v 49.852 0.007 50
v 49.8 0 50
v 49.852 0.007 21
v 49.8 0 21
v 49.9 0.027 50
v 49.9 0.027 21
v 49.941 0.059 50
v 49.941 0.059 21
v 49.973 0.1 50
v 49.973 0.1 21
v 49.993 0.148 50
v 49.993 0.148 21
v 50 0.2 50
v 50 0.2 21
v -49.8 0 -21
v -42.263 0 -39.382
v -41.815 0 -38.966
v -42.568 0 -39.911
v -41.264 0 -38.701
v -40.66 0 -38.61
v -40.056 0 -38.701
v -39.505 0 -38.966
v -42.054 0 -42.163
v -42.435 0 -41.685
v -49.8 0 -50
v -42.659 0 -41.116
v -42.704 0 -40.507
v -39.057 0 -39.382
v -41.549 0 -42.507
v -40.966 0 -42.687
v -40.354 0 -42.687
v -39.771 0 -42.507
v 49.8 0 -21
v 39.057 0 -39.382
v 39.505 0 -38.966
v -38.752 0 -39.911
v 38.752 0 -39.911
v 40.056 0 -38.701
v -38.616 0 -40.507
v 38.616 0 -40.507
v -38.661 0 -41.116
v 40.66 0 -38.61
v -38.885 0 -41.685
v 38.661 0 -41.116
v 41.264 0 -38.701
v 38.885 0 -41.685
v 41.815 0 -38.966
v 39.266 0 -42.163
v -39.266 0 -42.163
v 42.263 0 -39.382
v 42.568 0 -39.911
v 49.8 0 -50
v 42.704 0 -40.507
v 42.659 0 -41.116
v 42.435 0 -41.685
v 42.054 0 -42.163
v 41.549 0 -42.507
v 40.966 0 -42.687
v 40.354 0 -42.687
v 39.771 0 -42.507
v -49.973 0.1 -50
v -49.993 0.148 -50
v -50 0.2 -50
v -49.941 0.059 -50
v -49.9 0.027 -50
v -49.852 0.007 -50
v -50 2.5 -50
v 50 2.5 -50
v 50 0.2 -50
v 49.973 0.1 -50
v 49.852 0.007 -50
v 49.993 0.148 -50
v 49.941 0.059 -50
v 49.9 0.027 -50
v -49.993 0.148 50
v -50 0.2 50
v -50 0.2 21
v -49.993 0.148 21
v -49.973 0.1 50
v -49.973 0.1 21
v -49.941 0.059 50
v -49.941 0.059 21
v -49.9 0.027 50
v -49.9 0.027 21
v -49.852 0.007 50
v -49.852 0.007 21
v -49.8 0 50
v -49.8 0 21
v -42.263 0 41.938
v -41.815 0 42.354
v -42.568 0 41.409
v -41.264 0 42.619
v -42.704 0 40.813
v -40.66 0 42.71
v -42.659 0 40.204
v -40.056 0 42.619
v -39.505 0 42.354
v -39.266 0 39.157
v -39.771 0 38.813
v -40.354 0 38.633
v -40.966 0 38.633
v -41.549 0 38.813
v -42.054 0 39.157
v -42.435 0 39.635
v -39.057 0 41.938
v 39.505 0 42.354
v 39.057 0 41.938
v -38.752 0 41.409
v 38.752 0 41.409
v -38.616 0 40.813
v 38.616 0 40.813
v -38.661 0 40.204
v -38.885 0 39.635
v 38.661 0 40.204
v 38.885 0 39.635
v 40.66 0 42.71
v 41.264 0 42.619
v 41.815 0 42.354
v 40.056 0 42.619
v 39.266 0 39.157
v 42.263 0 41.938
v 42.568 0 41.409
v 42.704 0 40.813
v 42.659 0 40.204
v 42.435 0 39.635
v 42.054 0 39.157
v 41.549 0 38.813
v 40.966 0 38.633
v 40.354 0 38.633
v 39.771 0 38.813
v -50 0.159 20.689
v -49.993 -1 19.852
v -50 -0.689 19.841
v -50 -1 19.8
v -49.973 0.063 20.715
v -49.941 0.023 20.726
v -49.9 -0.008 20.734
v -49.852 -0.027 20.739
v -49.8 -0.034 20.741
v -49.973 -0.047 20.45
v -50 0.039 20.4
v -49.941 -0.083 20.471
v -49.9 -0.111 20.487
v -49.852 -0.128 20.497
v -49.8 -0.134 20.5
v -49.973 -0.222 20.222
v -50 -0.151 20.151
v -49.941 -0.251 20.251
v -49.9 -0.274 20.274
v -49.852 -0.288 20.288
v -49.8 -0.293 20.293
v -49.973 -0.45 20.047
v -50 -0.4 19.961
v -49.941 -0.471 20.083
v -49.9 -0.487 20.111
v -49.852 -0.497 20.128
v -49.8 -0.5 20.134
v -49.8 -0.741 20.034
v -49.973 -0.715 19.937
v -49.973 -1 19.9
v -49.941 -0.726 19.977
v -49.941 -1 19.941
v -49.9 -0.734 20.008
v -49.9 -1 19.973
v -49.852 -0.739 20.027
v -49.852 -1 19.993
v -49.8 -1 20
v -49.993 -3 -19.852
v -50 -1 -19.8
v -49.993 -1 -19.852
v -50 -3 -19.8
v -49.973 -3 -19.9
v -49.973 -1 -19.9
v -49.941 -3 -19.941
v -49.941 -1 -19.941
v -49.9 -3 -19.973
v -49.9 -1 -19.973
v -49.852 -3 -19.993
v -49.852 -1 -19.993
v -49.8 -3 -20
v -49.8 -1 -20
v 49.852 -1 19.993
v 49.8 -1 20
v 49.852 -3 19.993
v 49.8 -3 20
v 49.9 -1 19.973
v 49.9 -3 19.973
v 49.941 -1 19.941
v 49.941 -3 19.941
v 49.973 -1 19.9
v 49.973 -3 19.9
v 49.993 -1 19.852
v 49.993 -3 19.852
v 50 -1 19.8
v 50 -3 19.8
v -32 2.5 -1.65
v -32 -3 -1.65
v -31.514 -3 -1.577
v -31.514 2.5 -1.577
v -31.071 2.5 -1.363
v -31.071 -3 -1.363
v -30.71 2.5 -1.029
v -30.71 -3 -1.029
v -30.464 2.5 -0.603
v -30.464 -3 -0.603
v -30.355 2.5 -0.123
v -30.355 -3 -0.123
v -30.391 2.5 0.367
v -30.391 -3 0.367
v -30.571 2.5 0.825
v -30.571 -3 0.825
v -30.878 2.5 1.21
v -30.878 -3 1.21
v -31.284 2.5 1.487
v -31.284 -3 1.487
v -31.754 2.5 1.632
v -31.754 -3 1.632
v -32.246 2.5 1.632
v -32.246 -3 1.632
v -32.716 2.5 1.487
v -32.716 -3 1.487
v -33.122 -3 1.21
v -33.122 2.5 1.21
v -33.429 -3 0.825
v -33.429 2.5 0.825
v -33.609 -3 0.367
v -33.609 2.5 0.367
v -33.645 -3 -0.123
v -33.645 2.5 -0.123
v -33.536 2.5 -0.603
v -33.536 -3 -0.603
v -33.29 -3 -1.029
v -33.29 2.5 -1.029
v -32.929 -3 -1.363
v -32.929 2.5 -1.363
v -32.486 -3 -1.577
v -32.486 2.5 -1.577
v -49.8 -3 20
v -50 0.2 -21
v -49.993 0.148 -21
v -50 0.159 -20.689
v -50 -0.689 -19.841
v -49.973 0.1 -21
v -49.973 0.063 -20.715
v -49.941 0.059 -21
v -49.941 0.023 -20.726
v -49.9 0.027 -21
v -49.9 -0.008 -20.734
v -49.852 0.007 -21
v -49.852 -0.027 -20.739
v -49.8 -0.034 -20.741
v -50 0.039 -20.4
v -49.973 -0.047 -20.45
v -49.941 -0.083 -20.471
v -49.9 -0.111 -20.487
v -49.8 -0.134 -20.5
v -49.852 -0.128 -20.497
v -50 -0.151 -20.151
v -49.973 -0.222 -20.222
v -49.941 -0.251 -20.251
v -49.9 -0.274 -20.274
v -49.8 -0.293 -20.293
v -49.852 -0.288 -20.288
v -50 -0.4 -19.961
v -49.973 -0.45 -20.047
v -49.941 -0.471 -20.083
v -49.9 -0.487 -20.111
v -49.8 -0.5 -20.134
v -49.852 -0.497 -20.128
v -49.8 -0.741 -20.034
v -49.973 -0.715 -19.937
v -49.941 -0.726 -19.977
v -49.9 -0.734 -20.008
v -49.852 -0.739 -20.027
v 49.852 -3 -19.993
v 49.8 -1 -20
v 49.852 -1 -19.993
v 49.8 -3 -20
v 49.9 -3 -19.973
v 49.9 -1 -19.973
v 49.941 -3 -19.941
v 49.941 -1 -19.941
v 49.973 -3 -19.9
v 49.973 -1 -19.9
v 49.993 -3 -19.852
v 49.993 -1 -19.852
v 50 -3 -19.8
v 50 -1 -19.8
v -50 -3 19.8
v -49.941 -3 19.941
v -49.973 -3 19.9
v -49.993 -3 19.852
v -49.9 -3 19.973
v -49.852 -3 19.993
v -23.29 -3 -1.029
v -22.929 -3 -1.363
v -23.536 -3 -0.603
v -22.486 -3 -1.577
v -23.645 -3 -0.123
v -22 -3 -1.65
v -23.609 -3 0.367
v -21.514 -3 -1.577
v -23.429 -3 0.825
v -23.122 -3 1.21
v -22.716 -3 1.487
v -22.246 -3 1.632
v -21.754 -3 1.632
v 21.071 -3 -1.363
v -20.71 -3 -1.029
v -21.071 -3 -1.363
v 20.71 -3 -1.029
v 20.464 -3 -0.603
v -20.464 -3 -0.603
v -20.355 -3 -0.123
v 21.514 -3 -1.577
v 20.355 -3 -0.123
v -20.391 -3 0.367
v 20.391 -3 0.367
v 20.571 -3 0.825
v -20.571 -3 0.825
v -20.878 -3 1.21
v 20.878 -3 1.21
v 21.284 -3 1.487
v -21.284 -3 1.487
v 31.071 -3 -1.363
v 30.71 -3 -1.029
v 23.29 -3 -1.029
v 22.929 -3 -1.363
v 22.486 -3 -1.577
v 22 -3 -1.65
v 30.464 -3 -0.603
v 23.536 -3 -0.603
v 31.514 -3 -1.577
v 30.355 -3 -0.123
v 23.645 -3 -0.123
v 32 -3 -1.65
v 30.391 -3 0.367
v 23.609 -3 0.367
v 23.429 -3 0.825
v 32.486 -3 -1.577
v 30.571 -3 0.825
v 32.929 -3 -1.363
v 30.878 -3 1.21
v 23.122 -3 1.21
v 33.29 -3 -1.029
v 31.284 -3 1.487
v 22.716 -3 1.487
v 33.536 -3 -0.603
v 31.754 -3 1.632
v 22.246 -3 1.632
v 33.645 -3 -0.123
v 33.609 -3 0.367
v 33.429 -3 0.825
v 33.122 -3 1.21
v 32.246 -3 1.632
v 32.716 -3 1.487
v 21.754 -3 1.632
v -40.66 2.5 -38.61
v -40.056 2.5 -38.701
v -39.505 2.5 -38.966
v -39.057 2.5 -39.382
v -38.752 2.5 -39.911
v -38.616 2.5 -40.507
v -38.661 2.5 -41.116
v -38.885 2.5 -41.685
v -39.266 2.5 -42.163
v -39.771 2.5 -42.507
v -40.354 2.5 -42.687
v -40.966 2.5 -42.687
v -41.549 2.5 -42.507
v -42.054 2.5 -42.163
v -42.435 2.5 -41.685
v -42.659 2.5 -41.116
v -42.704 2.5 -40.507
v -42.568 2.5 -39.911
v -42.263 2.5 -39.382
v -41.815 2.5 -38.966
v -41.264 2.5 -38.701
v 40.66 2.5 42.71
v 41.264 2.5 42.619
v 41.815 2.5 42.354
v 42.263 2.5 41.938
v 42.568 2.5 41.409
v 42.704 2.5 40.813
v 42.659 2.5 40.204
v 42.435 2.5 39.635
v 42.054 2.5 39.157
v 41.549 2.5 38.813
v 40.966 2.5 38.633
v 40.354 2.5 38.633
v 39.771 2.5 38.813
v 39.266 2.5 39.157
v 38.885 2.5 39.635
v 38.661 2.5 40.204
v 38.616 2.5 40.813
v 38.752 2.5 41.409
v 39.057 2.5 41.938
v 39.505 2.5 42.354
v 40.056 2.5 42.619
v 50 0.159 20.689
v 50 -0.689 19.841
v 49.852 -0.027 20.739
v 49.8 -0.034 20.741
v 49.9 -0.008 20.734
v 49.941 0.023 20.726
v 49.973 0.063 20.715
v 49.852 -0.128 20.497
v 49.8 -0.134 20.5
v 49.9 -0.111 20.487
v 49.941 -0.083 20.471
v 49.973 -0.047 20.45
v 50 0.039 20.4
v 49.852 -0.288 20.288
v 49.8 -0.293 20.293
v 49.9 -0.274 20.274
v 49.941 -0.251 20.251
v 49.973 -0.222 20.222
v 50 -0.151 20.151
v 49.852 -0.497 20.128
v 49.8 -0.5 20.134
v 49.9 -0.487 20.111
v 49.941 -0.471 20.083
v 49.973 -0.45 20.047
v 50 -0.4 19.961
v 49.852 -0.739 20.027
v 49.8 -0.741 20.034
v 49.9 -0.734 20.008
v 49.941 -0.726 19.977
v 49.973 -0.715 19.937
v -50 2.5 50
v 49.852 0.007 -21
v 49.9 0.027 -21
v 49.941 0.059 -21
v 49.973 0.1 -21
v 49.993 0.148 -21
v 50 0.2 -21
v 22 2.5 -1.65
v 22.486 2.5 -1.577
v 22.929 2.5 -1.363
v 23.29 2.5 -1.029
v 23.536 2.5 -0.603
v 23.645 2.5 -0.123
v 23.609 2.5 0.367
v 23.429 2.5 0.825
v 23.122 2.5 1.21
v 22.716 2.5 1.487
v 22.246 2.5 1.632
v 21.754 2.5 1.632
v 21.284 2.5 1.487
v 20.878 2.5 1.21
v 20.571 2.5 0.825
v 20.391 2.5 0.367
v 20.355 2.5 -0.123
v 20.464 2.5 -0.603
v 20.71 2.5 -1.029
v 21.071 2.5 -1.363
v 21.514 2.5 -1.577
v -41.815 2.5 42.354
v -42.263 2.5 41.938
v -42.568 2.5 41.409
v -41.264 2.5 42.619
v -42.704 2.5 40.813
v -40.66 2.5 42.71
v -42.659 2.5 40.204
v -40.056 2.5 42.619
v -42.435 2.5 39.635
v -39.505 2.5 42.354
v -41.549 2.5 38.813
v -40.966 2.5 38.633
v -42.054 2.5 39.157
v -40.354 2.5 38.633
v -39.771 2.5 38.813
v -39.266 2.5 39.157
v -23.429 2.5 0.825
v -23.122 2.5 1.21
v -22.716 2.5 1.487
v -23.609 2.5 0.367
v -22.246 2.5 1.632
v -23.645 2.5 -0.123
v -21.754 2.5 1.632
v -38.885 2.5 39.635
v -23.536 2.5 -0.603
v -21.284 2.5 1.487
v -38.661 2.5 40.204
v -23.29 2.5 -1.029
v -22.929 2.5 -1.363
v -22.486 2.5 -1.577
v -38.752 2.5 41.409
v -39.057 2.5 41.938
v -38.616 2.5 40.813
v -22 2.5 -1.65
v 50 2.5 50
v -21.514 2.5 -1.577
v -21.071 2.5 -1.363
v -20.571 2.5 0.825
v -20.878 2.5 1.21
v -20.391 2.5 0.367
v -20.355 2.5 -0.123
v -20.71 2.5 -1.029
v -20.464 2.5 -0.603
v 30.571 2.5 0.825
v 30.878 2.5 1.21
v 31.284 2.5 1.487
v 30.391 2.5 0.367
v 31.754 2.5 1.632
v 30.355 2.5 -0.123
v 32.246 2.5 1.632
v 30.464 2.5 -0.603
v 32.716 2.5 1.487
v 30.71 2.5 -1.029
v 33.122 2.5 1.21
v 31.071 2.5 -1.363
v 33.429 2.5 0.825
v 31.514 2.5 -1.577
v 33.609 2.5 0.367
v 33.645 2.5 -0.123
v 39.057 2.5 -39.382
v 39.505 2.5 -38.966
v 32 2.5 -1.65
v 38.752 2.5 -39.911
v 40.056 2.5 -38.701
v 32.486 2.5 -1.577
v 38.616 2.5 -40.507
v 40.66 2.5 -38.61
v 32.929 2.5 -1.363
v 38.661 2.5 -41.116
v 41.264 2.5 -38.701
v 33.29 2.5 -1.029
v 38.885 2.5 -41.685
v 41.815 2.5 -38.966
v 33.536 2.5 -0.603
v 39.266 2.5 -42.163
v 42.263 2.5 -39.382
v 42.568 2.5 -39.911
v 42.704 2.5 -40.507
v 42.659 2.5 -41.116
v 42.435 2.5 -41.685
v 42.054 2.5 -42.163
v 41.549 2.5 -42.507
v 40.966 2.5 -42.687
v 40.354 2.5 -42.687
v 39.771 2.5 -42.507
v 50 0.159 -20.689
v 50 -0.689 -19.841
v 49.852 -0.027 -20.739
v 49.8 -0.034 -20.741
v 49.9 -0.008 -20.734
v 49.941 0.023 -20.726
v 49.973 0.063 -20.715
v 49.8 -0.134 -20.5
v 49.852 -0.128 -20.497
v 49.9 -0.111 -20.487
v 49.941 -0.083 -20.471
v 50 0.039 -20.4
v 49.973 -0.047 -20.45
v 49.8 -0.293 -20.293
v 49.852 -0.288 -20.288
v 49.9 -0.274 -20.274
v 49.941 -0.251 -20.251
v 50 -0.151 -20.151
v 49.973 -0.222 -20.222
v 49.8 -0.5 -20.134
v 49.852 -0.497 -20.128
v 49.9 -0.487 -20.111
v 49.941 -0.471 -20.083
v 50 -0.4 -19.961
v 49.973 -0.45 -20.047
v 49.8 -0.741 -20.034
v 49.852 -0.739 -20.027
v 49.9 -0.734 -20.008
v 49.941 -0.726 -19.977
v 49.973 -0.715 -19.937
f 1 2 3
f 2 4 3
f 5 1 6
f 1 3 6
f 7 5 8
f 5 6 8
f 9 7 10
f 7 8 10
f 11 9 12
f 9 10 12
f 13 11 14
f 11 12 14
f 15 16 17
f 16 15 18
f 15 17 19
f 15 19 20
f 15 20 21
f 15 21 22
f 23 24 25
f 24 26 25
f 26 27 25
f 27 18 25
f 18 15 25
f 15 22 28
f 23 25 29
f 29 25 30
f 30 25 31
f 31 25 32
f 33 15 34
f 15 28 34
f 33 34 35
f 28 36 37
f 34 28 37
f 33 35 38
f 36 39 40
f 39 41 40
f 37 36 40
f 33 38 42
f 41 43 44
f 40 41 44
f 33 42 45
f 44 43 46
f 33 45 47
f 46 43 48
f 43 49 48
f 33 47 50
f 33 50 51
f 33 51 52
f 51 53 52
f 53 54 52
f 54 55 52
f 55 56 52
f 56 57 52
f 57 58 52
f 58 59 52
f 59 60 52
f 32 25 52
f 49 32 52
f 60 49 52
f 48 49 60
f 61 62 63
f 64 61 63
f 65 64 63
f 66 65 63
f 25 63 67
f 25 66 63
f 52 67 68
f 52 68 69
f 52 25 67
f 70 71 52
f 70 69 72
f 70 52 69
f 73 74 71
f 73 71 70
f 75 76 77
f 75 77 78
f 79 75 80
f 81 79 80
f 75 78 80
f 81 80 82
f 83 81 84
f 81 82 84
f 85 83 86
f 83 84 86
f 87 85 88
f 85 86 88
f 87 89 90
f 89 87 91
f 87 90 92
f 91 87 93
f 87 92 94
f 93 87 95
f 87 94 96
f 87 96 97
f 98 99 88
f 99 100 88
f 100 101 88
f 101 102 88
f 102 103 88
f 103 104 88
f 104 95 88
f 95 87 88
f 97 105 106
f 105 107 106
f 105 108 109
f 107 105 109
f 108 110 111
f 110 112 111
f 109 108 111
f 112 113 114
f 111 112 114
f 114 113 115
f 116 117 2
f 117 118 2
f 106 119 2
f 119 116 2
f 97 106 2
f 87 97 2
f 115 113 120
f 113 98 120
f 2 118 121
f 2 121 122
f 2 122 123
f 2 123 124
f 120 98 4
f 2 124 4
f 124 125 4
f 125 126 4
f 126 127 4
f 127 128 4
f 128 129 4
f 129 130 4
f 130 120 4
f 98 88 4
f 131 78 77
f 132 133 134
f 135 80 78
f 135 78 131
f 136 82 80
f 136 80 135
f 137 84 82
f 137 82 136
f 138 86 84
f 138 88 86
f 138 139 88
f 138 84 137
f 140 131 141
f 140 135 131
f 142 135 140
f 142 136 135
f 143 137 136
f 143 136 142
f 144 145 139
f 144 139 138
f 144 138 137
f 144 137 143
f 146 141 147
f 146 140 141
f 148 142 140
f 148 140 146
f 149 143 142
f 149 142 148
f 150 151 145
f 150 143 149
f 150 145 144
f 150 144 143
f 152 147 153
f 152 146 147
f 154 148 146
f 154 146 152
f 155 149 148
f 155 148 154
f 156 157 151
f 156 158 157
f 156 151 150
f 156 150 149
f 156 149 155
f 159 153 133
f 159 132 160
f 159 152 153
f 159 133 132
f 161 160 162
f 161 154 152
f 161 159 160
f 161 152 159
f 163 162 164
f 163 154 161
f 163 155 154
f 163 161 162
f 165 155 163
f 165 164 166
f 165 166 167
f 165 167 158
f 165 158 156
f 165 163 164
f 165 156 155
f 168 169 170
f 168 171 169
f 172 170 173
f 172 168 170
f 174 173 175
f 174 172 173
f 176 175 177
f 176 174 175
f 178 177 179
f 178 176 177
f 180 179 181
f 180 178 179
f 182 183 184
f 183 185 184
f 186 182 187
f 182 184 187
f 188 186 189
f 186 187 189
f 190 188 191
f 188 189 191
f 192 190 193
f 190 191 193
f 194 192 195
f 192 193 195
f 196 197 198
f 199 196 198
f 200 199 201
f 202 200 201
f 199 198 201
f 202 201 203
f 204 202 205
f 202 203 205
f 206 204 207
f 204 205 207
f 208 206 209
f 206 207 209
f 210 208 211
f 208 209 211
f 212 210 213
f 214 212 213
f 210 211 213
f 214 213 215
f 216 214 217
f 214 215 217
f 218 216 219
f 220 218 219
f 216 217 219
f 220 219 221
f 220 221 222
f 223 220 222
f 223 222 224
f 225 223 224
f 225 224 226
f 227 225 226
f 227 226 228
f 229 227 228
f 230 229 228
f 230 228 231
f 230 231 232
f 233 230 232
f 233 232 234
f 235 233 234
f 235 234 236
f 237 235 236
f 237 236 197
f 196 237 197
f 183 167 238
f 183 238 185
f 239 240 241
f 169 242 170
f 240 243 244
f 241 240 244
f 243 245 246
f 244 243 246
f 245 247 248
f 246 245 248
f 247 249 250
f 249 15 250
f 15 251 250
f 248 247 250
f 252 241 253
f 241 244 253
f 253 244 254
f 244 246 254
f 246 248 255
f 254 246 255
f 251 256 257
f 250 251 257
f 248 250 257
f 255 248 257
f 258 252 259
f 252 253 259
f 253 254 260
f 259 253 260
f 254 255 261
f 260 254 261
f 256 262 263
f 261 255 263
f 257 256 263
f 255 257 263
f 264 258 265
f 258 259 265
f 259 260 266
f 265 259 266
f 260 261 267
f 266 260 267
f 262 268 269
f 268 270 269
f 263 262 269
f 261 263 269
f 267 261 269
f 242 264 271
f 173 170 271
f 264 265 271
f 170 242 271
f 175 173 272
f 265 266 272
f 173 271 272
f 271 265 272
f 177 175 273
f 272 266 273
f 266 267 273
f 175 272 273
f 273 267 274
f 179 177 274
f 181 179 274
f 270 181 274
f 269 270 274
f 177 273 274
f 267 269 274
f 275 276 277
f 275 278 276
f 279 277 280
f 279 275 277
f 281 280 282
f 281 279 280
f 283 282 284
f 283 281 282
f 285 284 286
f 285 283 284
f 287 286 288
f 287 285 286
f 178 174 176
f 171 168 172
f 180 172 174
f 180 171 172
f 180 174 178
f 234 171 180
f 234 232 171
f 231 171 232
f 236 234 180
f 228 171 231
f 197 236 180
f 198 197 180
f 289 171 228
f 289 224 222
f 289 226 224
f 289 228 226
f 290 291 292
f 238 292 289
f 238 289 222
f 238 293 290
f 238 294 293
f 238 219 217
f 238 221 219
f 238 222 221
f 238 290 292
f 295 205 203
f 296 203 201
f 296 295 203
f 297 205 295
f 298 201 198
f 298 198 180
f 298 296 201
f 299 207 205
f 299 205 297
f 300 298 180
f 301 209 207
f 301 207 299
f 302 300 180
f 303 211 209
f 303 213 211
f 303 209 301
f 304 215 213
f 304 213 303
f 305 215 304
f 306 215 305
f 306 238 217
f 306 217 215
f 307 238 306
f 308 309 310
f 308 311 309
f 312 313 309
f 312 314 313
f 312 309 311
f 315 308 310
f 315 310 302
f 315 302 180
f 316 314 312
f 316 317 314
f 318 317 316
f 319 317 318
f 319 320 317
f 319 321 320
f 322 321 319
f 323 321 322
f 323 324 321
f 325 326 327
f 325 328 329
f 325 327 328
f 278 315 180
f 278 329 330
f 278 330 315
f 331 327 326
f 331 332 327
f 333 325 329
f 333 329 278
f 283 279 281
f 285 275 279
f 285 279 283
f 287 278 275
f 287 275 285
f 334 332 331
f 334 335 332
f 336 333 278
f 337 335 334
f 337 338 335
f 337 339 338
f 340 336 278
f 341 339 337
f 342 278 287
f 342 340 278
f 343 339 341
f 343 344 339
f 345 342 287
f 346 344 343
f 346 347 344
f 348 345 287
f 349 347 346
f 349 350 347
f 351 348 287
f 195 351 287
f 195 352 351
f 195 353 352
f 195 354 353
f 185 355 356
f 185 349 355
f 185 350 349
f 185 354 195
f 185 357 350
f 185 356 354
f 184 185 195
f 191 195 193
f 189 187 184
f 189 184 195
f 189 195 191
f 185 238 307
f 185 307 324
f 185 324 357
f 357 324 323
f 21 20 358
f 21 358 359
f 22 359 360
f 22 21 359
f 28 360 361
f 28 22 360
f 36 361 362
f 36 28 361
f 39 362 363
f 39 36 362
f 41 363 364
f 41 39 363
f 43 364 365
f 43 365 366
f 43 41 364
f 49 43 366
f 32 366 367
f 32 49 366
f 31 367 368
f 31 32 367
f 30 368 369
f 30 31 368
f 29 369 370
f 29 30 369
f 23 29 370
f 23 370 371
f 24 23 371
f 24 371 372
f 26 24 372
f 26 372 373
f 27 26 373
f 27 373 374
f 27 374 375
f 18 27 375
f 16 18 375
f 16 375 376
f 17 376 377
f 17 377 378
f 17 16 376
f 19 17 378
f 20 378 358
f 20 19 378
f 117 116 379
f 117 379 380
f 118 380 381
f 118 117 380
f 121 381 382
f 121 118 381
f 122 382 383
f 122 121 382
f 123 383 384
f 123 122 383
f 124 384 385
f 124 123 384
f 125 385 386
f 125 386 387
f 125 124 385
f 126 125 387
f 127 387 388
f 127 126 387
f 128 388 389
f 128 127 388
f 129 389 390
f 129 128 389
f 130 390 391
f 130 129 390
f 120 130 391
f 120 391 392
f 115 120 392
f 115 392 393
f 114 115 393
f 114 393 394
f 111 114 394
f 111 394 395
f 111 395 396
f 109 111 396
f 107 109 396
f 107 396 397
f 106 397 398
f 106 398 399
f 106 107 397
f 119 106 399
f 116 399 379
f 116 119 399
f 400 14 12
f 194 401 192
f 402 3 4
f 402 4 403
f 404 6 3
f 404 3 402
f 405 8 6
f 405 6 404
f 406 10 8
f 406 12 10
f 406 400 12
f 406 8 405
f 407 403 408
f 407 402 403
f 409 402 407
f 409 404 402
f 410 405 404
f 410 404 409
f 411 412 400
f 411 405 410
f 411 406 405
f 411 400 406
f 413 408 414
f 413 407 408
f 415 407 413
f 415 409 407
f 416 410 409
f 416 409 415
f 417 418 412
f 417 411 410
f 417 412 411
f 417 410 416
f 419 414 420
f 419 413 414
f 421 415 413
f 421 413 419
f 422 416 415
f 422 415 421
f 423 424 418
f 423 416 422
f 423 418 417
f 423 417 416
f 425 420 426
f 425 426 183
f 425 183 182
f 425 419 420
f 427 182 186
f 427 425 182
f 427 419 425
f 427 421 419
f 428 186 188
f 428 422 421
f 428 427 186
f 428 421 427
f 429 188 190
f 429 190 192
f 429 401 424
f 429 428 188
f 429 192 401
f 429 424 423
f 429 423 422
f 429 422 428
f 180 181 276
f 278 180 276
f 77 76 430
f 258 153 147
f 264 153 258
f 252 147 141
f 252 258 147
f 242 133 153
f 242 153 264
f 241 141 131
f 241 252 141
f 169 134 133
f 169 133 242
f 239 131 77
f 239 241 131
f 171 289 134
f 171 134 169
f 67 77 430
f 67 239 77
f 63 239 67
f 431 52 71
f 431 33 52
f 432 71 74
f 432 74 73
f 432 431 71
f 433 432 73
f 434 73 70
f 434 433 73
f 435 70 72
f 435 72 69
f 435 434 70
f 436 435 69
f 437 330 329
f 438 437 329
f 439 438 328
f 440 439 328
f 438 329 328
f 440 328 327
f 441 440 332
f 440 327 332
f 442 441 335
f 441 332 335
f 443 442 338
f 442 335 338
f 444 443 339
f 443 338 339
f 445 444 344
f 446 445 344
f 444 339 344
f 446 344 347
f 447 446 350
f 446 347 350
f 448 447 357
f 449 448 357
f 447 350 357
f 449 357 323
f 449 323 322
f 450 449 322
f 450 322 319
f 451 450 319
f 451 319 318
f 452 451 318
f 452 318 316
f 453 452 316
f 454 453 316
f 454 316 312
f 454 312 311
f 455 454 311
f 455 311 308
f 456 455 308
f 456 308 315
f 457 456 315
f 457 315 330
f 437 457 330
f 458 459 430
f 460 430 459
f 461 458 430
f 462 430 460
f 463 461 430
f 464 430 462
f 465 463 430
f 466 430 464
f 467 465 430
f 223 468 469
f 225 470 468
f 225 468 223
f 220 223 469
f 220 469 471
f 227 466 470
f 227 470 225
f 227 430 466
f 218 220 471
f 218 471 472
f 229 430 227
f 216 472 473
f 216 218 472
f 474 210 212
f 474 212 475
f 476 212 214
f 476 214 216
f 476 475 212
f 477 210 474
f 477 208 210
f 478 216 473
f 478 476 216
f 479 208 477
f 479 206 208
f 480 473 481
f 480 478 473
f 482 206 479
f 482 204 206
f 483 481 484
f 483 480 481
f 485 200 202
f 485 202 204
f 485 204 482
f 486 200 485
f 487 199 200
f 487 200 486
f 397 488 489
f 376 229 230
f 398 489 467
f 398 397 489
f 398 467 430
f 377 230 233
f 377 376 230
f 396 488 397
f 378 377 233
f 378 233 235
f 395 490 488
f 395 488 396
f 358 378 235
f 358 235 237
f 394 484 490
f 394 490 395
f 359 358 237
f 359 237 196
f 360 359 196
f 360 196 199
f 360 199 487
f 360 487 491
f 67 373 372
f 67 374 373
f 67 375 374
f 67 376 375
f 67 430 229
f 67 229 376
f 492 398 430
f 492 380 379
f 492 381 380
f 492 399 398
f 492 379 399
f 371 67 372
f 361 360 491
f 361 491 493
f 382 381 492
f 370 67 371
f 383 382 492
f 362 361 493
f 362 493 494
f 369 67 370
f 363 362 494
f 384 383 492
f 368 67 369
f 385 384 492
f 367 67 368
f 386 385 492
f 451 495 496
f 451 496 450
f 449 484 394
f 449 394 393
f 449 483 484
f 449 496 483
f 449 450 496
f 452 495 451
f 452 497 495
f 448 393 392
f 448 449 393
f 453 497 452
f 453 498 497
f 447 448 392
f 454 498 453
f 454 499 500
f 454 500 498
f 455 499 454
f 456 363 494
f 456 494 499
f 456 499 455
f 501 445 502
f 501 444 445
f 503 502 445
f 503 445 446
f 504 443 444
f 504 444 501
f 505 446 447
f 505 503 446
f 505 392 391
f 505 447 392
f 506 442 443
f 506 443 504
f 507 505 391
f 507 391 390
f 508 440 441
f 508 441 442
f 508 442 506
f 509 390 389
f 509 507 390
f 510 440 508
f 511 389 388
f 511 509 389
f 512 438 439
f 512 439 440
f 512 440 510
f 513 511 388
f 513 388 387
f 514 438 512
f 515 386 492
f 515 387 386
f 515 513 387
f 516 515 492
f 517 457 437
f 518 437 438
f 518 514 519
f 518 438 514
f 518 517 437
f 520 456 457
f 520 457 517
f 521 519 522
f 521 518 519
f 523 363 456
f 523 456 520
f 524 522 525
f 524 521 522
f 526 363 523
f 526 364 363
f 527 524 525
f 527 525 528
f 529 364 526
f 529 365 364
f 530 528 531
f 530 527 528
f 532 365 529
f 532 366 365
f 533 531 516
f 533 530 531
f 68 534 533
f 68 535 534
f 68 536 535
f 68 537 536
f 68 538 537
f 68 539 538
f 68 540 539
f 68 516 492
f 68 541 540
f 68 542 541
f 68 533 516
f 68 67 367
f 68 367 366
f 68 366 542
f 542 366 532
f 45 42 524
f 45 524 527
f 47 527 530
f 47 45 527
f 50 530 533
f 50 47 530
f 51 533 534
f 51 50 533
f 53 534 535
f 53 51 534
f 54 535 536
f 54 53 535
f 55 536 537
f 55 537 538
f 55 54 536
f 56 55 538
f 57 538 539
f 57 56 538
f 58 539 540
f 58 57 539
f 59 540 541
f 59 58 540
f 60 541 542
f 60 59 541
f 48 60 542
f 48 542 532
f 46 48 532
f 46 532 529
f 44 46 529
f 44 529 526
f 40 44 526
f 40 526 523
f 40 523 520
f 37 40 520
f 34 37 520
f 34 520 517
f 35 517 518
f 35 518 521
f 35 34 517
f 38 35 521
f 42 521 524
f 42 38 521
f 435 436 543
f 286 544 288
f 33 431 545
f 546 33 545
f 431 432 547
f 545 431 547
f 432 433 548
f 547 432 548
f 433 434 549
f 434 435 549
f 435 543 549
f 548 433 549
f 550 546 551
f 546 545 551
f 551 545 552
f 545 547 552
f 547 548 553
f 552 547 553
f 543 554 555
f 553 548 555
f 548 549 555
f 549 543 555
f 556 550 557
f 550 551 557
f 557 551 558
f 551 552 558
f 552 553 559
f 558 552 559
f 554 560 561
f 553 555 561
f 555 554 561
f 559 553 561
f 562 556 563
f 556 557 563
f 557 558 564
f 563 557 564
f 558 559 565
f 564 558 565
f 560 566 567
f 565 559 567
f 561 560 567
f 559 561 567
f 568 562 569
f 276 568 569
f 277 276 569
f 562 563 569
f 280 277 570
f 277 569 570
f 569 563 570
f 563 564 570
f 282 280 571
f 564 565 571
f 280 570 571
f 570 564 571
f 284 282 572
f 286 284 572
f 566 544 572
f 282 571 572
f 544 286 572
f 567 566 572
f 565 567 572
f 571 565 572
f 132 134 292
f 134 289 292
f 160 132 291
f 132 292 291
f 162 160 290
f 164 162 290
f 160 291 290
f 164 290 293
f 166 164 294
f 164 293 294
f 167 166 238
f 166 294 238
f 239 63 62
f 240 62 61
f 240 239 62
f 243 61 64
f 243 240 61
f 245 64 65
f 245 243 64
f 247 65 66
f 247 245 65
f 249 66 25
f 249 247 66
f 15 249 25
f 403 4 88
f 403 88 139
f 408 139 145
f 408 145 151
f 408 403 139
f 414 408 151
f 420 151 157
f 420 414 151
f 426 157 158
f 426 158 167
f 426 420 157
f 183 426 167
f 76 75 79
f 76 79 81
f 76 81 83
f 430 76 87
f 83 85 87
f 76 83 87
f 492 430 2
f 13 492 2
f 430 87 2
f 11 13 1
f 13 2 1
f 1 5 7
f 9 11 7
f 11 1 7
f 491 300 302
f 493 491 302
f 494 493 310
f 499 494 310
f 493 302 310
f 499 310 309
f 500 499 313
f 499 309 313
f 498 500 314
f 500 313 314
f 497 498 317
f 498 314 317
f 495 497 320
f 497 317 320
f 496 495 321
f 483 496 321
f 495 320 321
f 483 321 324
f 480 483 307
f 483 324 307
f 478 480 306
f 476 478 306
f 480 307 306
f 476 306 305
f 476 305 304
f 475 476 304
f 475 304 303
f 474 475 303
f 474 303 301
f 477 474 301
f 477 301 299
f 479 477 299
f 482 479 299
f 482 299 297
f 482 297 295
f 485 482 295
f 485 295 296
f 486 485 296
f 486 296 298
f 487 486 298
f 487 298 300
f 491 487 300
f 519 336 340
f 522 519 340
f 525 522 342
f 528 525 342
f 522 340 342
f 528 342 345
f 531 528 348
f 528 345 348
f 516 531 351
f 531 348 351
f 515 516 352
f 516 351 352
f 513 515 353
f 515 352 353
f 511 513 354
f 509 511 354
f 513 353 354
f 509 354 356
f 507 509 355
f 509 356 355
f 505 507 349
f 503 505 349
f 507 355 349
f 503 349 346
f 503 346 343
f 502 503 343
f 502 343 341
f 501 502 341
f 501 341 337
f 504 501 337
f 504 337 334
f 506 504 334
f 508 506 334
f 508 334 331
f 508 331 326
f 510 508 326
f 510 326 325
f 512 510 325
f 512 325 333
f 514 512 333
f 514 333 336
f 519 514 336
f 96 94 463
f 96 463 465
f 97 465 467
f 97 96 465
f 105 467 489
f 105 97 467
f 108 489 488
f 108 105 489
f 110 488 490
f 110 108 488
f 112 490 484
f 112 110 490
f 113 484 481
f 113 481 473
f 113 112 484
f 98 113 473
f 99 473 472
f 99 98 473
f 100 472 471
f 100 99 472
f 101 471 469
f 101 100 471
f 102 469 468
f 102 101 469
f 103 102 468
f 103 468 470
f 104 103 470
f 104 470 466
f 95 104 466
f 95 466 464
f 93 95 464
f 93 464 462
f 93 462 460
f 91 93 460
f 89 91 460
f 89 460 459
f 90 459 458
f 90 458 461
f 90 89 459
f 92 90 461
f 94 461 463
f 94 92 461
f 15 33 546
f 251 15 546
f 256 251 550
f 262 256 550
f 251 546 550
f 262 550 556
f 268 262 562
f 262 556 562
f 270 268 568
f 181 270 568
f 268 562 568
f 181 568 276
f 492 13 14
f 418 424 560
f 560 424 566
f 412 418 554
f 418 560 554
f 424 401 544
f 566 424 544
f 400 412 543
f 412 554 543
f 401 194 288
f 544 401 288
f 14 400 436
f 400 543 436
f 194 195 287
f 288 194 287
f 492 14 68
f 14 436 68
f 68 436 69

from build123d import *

# Parameters (mm, degrees)
SKETCH1_W           = 100
SKETCH1_H           = 100
SKETCH1_R           = 2.05
BOSS_EXTRUDE1_DEPTH = 2.5
SKETCH3_W           = 100
SKETCH3_H           = 40
BOSS_EXTRUDE2_DEPTH = 3
FILLET2_R           = 1
FILLET4_R           = 0.2
SKETCH4_R           = 1.65
CUT_EXTRUDE1_DEPTH  = 71.924255371


with BuildPart() as part:
    # Sketch1 → Boss-Extrude1 (new body)
    with BuildSketch(Plane(origin=(0, 0, 0), x_dir=(1, 0, 0), z_dir=(0, 1, 0))):
        Rectangle(SKETCH1_W, SKETCH1_H)
        with Locations(Location((-40.66, 40.66, 0), (0, 0, 270))):
            Circle(SKETCH1_R, mode=Mode.SUBTRACT)
        with Locations(Location((40.66, 40.66, 0), (0, 0, 270))):
            Circle(SKETCH1_R, mode=Mode.SUBTRACT)
        with Locations(Location((40.66, -40.66, 0), (0, 0, 270))):
            Circle(SKETCH1_R, mode=Mode.SUBTRACT)
        with Locations(Location((-40.66, -40.66, 0), (0, 0, 270))):
            Circle(SKETCH1_R, mode=Mode.SUBTRACT)
    extrude(amount=BOSS_EXTRUDE1_DEPTH)

    # Sketch3 → Boss-Extrude2 (add)
    with BuildSketch(Plane.XZ):
        Rectangle(SKETCH3_W, SKETCH3_H)
    extrude(amount=BOSS_EXTRUDE2_DEPTH)

    # Fillet2
    fillet2_edges = [part.edges().sort_by_distance(p)[0] for p in [
        (0, 0, 20),
        (0, 0, -20),
    ]]
    fillet(fillet2_edges, radius=FILLET2_R)

    # Fillet4
    fillet4_edges = [part.edges().sort_by_distance(p)[0] for p in [
        (50, -2, -20),
        (50, -2, 20),
        (-50, -2, 20),
        (-50, -2, -20),
        (50, 0, -35.5),
        (-50, 0, 35.5),
        (50, -0.292893219, -20.292893219),
        (-50, -0.292893219, -20.292893219),
        (-50, -0.292893219, 20.292893219),
        (50, -0.292893219, 20.292893219),
        (-50, 0, -35.5),
        (50, 0, 35.5),
    ]]
    fillet(fillet4_edges, radius=FILLET4_R)

    # Sketch4 → Cut-Extrude1 (cut, through all)
    with BuildSketch(Plane.XZ.offset(3)):
        with Locations(Location((-32, 0, 0), (0, 0, 270))):
            Circle(SKETCH4_R)
        with Locations(Location((-22, 0, 0), (0, 0, 270))):
            Circle(SKETCH4_R)
        with Locations(Location((22, 0, 0), (0, 0, 270))):
            Circle(SKETCH4_R)
        with Locations(Location((32, 0, 0), (0, 0, 270))):
            Circle(SKETCH4_R)
    extrude(amount=-CUT_EXTRUDE1_DEPTH, mode=Mode.SUBTRACT)


solid = part.part
